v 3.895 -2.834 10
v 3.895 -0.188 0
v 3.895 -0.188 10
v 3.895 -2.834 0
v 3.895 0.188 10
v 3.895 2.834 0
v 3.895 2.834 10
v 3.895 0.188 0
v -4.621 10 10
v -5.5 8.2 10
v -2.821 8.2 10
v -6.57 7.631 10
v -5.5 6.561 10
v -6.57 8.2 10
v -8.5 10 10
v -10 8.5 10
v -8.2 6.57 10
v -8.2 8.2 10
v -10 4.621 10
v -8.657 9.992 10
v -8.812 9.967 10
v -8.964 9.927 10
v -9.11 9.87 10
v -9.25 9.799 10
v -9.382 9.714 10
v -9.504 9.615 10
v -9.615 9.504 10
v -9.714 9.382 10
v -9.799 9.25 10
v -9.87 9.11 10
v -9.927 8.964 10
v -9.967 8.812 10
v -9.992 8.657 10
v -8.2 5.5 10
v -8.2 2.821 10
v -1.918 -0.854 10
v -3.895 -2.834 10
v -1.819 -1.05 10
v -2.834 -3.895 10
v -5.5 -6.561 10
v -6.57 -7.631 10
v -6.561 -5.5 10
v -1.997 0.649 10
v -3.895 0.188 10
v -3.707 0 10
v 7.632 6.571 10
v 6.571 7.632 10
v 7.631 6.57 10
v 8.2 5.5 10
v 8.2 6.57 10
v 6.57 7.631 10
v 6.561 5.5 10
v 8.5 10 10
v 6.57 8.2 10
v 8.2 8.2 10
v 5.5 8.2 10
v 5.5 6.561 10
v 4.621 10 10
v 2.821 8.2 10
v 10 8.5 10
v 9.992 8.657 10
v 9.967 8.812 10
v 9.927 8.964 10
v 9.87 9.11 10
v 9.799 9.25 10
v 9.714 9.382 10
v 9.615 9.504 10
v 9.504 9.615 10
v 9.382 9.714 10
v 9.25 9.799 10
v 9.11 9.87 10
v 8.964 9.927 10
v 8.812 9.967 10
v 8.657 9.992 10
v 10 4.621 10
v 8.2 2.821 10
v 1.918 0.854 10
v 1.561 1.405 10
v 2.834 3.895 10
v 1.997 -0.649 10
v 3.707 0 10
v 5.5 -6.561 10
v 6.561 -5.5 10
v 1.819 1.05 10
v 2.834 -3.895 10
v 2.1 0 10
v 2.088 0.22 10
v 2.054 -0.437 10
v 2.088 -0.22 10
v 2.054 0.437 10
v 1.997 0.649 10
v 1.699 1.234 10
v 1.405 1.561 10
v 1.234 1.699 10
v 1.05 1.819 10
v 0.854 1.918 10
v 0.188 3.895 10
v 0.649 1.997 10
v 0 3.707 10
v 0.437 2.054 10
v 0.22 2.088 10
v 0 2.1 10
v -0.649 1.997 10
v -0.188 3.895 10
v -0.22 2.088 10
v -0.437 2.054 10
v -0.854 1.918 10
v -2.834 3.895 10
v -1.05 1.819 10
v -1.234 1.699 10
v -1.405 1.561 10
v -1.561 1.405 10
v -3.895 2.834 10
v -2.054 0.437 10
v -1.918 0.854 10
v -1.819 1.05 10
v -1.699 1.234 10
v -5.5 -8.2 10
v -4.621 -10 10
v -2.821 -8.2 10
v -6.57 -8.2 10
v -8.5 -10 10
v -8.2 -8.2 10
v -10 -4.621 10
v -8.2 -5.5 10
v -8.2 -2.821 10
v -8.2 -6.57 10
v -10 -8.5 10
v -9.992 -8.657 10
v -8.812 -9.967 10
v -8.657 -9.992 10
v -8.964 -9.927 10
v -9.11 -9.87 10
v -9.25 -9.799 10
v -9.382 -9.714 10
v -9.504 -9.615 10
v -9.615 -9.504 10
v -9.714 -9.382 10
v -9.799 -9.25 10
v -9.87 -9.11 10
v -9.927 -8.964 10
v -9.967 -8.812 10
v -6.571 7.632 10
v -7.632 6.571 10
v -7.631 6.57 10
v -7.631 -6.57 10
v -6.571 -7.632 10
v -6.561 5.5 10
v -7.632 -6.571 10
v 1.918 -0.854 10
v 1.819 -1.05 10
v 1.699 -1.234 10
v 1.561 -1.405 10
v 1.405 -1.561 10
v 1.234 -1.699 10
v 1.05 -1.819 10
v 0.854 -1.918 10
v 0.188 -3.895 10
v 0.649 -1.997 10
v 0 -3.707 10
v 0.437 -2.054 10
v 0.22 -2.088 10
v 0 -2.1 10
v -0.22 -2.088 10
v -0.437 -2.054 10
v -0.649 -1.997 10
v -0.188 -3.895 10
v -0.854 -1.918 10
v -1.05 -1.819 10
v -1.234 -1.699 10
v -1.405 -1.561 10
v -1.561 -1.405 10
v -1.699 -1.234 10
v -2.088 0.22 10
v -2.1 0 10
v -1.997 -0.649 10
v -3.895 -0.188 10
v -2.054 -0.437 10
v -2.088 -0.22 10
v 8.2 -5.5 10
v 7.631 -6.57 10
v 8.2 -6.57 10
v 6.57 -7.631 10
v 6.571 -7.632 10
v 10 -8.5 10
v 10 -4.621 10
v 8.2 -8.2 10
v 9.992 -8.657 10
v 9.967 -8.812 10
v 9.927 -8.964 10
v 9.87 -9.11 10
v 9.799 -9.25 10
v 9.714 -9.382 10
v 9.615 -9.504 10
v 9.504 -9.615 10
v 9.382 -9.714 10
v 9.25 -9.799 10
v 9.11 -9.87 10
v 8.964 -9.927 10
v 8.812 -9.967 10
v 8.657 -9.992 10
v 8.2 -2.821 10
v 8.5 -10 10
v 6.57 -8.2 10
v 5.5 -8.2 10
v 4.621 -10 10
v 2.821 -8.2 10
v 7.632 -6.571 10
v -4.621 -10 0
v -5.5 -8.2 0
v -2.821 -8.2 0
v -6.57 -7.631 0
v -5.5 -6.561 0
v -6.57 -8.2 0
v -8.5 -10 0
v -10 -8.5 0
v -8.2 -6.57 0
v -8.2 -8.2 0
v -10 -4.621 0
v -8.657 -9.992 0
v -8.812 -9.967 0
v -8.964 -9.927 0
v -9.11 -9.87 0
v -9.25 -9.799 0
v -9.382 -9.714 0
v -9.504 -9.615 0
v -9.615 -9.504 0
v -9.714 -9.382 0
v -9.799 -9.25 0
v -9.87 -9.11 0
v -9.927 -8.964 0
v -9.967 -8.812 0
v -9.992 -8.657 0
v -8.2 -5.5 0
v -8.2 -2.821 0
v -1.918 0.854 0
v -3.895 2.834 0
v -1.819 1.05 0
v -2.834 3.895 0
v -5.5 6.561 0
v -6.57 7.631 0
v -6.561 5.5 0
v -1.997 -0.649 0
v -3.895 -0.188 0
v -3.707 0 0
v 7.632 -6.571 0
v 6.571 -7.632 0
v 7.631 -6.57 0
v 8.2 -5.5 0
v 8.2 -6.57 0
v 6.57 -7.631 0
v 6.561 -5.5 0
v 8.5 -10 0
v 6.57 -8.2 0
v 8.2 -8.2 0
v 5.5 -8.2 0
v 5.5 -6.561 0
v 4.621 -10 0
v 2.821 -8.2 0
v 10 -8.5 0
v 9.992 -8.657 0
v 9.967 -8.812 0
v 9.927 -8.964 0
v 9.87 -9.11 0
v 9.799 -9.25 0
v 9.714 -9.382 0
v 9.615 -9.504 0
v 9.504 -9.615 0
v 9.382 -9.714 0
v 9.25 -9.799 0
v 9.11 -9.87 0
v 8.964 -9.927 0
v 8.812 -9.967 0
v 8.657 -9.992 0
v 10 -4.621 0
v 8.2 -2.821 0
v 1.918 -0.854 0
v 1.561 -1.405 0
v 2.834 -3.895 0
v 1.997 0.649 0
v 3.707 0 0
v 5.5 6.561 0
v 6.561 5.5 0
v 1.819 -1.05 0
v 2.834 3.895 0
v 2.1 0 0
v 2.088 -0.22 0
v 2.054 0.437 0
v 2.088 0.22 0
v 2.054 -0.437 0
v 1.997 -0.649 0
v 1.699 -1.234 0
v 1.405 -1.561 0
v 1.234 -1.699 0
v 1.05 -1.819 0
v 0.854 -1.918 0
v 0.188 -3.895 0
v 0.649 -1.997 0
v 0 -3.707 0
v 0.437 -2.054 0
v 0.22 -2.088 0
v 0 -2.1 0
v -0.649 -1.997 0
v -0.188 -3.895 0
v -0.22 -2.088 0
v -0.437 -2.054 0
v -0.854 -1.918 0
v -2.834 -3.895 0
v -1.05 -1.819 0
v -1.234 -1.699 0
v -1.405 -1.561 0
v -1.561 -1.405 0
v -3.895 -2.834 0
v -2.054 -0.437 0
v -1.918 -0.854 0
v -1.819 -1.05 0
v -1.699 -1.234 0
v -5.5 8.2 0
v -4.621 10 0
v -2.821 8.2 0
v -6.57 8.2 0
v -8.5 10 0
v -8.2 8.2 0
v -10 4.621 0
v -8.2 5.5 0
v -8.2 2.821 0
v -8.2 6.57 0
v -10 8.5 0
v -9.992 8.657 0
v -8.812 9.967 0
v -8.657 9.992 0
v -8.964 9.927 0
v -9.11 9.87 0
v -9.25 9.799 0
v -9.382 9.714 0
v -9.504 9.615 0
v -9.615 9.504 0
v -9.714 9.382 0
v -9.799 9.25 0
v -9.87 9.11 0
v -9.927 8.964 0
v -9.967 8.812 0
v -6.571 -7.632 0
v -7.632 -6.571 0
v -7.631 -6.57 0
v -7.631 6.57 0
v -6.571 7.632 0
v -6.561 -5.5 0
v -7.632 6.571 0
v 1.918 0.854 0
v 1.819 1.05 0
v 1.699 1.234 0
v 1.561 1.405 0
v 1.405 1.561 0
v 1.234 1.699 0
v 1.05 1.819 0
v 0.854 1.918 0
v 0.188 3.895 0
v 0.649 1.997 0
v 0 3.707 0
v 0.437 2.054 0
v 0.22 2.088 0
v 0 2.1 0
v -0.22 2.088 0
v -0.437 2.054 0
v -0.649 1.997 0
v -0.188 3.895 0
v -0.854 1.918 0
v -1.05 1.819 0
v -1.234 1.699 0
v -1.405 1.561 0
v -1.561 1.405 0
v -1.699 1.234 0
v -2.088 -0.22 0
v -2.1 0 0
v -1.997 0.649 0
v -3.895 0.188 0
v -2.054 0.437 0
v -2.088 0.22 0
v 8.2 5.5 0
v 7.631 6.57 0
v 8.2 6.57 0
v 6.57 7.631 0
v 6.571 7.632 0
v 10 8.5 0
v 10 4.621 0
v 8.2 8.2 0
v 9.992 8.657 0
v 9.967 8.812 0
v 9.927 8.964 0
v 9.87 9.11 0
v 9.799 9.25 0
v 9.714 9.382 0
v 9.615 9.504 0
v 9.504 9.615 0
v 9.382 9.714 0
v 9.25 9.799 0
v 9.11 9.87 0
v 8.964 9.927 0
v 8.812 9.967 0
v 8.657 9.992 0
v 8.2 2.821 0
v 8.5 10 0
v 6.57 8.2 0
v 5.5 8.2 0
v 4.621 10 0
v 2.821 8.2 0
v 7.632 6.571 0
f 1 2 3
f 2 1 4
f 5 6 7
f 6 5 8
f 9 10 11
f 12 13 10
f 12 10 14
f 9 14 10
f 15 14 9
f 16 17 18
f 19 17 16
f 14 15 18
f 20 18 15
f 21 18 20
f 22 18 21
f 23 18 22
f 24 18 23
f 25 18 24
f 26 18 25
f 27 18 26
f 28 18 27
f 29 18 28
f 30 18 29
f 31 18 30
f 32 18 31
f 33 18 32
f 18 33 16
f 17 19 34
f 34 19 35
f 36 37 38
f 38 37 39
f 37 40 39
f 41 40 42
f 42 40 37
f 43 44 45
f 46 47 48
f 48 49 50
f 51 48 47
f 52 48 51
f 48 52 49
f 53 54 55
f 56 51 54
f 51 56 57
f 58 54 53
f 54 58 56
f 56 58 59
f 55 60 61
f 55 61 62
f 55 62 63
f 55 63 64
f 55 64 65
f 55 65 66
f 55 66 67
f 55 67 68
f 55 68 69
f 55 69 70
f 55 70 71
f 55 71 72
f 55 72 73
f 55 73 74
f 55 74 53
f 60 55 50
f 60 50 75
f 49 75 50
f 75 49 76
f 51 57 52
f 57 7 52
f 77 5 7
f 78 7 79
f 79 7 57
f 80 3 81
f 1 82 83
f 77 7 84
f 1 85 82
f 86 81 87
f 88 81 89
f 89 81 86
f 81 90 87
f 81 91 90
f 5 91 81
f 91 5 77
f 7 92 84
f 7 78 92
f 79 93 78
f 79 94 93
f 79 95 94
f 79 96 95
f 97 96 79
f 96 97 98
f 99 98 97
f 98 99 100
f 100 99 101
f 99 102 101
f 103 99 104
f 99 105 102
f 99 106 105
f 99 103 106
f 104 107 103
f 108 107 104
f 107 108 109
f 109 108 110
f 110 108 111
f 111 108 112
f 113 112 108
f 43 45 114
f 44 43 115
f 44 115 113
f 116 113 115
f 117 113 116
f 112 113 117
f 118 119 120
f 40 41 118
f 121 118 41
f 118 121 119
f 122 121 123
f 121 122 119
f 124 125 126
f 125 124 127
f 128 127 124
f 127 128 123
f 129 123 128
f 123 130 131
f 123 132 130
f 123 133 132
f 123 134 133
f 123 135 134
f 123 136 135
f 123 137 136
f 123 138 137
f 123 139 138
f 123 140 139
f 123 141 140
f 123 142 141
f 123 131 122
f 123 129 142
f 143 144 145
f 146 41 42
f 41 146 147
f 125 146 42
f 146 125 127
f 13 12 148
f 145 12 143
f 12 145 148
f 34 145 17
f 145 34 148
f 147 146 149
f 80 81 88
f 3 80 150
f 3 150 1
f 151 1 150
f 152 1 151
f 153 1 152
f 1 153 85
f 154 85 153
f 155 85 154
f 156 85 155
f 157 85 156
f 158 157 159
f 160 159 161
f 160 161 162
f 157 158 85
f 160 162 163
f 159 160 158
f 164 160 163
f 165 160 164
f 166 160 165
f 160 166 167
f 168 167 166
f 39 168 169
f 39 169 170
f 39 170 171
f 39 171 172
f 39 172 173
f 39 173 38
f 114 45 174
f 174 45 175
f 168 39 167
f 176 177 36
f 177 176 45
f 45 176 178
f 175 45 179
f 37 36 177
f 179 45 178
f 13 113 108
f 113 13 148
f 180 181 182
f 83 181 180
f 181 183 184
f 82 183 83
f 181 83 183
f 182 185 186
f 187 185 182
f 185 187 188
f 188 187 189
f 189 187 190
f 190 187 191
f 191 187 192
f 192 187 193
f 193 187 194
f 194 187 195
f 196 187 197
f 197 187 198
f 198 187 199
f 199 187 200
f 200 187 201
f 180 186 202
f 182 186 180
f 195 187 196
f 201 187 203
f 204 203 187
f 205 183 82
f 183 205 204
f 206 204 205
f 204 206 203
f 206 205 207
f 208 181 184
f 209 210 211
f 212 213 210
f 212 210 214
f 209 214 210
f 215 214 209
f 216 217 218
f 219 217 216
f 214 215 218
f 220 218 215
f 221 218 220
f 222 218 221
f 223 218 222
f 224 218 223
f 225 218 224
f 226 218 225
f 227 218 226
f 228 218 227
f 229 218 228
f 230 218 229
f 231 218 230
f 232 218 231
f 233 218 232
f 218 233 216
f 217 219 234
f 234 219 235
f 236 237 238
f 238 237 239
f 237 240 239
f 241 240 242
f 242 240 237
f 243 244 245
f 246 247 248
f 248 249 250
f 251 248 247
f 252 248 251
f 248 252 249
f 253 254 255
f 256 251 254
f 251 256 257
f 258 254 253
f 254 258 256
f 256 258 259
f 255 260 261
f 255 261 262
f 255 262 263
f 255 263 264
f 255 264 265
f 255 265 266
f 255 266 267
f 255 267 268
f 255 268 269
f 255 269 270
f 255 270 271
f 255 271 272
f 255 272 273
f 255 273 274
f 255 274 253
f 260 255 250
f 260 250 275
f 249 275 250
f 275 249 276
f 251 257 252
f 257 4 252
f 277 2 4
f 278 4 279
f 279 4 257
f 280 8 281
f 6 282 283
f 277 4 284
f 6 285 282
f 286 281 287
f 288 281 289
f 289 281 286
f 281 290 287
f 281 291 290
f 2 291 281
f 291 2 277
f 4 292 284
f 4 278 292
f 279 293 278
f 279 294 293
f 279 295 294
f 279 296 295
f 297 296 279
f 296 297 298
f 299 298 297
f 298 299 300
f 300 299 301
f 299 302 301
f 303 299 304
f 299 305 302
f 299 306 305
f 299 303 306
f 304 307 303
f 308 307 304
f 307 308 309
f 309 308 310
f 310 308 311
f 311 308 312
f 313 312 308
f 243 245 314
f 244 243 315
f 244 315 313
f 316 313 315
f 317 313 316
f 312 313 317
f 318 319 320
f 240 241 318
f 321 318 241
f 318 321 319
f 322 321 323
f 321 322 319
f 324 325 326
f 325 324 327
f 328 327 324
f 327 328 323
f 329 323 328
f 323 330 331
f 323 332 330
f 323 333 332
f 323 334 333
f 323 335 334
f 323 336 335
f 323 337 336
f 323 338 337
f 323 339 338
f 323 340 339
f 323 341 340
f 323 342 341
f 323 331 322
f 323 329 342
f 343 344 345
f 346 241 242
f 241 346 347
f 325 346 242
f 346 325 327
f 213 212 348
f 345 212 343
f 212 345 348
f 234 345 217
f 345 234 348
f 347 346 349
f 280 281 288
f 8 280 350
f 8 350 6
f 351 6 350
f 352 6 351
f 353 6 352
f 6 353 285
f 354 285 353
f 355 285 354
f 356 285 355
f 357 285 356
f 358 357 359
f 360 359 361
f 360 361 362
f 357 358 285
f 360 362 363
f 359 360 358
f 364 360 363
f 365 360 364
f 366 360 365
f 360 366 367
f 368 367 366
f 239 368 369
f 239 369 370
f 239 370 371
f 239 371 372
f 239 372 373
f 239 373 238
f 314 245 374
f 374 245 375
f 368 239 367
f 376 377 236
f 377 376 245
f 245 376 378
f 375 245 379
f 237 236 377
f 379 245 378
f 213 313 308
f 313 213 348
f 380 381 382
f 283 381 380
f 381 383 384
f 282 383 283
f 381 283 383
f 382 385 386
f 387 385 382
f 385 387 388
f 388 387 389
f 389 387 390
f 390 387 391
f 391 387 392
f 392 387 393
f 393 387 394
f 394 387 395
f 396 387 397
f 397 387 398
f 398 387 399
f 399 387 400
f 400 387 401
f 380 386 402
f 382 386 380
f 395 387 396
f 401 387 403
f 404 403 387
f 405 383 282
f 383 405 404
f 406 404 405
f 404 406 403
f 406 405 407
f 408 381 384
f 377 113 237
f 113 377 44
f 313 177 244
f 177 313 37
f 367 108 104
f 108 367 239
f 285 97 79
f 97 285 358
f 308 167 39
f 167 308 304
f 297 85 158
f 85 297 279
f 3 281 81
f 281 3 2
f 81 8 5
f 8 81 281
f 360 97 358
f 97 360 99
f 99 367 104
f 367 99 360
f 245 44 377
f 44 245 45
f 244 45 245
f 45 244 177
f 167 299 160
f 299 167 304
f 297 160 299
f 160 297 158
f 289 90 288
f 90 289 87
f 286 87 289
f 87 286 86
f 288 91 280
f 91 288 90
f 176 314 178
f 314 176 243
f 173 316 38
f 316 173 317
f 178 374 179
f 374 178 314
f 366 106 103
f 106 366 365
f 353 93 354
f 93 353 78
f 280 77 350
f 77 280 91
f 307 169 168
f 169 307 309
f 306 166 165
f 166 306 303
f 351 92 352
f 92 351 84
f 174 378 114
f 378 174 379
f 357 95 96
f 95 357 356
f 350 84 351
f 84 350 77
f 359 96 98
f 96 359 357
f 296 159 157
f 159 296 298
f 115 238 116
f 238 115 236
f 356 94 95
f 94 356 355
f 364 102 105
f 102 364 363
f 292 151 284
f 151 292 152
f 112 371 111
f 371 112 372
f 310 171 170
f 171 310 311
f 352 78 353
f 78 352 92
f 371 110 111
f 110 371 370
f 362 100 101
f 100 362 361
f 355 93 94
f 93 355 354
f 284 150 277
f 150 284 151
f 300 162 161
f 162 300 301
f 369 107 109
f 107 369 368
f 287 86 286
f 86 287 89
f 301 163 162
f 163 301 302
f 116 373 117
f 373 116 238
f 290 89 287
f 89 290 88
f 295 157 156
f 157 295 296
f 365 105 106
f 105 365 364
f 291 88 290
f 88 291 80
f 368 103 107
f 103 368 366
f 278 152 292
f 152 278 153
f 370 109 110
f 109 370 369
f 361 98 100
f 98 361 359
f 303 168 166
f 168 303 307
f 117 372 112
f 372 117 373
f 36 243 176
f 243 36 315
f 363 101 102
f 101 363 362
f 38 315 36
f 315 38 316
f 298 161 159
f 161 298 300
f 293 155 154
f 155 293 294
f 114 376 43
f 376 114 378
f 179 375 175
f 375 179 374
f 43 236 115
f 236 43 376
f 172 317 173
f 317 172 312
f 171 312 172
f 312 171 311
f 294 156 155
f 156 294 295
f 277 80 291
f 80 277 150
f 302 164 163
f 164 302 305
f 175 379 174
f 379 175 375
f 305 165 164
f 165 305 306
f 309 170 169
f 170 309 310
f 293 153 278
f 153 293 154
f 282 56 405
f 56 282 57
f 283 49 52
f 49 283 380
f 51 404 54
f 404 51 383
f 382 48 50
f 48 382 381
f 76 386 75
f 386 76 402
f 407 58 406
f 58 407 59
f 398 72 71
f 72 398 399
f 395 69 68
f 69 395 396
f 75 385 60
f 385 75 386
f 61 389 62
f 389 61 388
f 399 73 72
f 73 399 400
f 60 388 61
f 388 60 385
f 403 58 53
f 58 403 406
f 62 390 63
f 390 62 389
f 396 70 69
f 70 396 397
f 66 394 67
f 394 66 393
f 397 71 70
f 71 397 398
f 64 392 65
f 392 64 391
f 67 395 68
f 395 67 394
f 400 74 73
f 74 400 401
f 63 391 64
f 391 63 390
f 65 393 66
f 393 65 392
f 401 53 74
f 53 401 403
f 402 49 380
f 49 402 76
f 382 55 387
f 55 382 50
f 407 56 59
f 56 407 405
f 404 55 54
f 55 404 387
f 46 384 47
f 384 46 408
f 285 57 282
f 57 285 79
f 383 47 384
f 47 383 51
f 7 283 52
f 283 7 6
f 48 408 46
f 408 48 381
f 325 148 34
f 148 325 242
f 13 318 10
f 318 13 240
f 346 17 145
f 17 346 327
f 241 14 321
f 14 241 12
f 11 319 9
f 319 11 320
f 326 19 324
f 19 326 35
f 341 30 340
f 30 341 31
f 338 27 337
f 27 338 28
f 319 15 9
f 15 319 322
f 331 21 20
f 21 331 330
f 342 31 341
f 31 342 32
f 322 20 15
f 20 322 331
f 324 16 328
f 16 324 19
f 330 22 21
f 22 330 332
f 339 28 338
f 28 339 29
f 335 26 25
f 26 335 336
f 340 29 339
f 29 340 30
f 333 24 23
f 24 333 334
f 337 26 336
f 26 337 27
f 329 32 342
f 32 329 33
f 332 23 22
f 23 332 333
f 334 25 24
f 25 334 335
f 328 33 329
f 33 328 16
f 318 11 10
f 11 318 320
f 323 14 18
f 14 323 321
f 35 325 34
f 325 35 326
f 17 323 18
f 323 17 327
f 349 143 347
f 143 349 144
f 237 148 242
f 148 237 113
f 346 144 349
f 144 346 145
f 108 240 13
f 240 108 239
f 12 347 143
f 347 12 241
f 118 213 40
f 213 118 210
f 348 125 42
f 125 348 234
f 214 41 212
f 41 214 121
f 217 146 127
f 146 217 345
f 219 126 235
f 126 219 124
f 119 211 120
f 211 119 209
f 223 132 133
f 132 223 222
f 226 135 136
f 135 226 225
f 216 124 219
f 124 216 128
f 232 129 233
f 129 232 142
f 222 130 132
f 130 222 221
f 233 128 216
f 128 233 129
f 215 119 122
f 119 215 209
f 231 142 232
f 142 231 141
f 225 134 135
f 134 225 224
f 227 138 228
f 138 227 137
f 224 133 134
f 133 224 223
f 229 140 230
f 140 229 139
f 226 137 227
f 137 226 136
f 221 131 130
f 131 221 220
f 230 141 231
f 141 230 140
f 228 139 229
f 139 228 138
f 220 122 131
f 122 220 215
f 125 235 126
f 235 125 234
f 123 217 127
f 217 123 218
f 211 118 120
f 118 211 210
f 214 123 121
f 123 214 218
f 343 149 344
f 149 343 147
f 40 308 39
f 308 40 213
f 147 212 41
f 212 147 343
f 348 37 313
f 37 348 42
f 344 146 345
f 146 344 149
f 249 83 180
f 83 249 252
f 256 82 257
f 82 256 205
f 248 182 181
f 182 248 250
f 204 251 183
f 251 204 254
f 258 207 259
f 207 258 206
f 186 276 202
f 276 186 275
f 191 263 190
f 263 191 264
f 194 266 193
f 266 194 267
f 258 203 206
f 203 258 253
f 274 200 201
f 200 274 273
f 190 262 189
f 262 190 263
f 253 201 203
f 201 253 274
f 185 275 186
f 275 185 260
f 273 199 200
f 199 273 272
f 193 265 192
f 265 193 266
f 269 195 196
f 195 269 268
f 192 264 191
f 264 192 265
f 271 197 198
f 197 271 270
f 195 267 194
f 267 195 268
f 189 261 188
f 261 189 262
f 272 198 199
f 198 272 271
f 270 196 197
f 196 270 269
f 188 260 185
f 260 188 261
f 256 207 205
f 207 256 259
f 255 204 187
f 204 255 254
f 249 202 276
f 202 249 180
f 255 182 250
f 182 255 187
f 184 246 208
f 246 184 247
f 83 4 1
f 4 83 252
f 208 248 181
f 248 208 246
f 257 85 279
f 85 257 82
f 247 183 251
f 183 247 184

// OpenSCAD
shape="20x20";//[20x20,20x40,20x60,20x80,40x40,C-Beam]
lenght=10;

//////////////
$fn=60;
module center() {
    difference() {
        
        intersection() {
            translate([0,0,0.5]) cube([7.79,7.79,1],center=true);
            cylinder(d=13.5,h=3,center=true,$fn=4);
        }
            
        
        cylinder(d=4.2,h=3,center=true);
        for(i=[0:90:270]) rotate([0,0,i]) translate([7.2425,0,0]) rotate([0,0,45]) cube(5,center=true);
    }
}




module corner() {
    difference() {
        translate([5.5,5.5,0]) cube([3,3,1]);
        translate([5.5+1.07,5.5+1.07,-0.5]) cube([3,3,2]);
    }
    translate([3,3,0])rotate([0,0,45]) translate([0,-0.75,0]) cube([5.8,1.5,1]);
    difference() {
        hull() {for(i=[0,1],j=[0,1]) translate([i*8.5,j*8.5,0]) cylinder(d=3,h=1);}
        for(i=[0,90]) rotate([0,0,i]) translate([12.45,0,0]) rotate([0,0,45]) cube(10,center=true);
        cube(16.4,center=true);
    }
}

module raccord() {
    translate([-10,0,0]) {
        difference() {
            translate([0,8.2,0]) cube([20,1.8,1]);
            for(i=[0,20]) translate([i,12.45,0]) rotate([0,0,45]) cube(10,center=true);
        }
        translate([10,0,0]) for(i=[-1,1]) scale([i,1,1]) translate([5.39868/2,10-1.8-1.96,0]) cube([1.8,2,1]);
         for(i=[0,1]) translate([i*20,0,0]) rotate([0,0,i*90]) translate([3,3,0])rotate([0,0,45]) translate([0,-0.75,0]) cube([5.33205,1.5,1]);
    }
}

module inner_corner() {
    difference() {
        union() {
            translate([10,0,0]) raccord();
            translate([0,10,0]) rotate([0,0,-90]) raccord();
        }
        translate([0,0,-0.5]) cube([11,8.2,3]);
        translate([0,0,-0.5]) cube([8.2,11,3]);
    }
    translate([3,3,0])rotate([0,0,45]) translate([0,-0.75,0]) cube([9,1.5,1]);  
}


module V_slot(shape,lenght) {
scale([1,1,lenght]) {
    if (shape=="20x20") {
            center();
            for(i=[0:90:270]) rotate([0,0,i]) corner();
        }
        
    else if (shape=="20x40") {
            for(i=[-1,1]) translate([i*10,0,0]) center();
            for(i=[-1,1]) scale([1,i,1]) raccord();
            for(j=[-1,1]) scale([j,1,1]) translate([10,0,0]) for(i=[0,-90]) rotate([0,0,i]) corner();
        }
        
    else if (shape=="20x60") {
            for(i=[-1,0,1]) translate([i*20,0,0]) center();
            for(i=[-1,1]) scale([1,i,1]) for(i=[-1,1]) translate([i*10,0,0]) raccord();
            for(j=[-1,1]) scale([j,1,1]) translate([20,0,0]) for(i=[0,-90]) rotate([0,0,i]) corner();
        }
        
    else if (shape=="20x80") {
            for(i=[-3,-1,1,3]) translate([i*10,0,0]) center();
            for(i=[-1,1]) scale([1,i,1]) for(i=[-1,0,1]) translate([i*20,0,0]) raccord();
            for(j=[-1,1]) scale([j,1,1]) translate([30,0,0]) for(i=[0,-90]) rotate([0,0,i]) corner();
        }
        
    else if (shape=="40x40") {
            for(i=[0:90:270]) rotate([0,0,i]) {
                translate([10,10,0]) center();
                translate([0,10,0]) raccord();
                translate([10,10,0]) corner();
            }
        }
        
    else {

        for(i=[-3,-1,1,3]) translate([i*10,-10,0]) center();
        for(i=[-3,,3]) translate([i*10,10,0]) center();
            
        scale([1,-1,1]) for(i=[-1,0,1]) translate([i*20,10,0]) raccord();
        for(i=[-90,90]) rotate([0,0,i]) translate([0,30,0]) raccord();
        translate([0,-10,0]) raccord();
            
        for(j=[-1,1]) scale([j,1,1]) translate([30,-10,0]) rotate([0,0,-90]) corner();
        for(j=[-1,1]) scale([j,1,1]) translate([30,10,0]) for(i=[0,90]) rotate([0,0,i]) corner();
        
        for(j=[-1,1]) scale([j,1,1]) translate([-30,-10,0]) inner_corner();
    
    }
}

}

V_slot(shape,lenght);
